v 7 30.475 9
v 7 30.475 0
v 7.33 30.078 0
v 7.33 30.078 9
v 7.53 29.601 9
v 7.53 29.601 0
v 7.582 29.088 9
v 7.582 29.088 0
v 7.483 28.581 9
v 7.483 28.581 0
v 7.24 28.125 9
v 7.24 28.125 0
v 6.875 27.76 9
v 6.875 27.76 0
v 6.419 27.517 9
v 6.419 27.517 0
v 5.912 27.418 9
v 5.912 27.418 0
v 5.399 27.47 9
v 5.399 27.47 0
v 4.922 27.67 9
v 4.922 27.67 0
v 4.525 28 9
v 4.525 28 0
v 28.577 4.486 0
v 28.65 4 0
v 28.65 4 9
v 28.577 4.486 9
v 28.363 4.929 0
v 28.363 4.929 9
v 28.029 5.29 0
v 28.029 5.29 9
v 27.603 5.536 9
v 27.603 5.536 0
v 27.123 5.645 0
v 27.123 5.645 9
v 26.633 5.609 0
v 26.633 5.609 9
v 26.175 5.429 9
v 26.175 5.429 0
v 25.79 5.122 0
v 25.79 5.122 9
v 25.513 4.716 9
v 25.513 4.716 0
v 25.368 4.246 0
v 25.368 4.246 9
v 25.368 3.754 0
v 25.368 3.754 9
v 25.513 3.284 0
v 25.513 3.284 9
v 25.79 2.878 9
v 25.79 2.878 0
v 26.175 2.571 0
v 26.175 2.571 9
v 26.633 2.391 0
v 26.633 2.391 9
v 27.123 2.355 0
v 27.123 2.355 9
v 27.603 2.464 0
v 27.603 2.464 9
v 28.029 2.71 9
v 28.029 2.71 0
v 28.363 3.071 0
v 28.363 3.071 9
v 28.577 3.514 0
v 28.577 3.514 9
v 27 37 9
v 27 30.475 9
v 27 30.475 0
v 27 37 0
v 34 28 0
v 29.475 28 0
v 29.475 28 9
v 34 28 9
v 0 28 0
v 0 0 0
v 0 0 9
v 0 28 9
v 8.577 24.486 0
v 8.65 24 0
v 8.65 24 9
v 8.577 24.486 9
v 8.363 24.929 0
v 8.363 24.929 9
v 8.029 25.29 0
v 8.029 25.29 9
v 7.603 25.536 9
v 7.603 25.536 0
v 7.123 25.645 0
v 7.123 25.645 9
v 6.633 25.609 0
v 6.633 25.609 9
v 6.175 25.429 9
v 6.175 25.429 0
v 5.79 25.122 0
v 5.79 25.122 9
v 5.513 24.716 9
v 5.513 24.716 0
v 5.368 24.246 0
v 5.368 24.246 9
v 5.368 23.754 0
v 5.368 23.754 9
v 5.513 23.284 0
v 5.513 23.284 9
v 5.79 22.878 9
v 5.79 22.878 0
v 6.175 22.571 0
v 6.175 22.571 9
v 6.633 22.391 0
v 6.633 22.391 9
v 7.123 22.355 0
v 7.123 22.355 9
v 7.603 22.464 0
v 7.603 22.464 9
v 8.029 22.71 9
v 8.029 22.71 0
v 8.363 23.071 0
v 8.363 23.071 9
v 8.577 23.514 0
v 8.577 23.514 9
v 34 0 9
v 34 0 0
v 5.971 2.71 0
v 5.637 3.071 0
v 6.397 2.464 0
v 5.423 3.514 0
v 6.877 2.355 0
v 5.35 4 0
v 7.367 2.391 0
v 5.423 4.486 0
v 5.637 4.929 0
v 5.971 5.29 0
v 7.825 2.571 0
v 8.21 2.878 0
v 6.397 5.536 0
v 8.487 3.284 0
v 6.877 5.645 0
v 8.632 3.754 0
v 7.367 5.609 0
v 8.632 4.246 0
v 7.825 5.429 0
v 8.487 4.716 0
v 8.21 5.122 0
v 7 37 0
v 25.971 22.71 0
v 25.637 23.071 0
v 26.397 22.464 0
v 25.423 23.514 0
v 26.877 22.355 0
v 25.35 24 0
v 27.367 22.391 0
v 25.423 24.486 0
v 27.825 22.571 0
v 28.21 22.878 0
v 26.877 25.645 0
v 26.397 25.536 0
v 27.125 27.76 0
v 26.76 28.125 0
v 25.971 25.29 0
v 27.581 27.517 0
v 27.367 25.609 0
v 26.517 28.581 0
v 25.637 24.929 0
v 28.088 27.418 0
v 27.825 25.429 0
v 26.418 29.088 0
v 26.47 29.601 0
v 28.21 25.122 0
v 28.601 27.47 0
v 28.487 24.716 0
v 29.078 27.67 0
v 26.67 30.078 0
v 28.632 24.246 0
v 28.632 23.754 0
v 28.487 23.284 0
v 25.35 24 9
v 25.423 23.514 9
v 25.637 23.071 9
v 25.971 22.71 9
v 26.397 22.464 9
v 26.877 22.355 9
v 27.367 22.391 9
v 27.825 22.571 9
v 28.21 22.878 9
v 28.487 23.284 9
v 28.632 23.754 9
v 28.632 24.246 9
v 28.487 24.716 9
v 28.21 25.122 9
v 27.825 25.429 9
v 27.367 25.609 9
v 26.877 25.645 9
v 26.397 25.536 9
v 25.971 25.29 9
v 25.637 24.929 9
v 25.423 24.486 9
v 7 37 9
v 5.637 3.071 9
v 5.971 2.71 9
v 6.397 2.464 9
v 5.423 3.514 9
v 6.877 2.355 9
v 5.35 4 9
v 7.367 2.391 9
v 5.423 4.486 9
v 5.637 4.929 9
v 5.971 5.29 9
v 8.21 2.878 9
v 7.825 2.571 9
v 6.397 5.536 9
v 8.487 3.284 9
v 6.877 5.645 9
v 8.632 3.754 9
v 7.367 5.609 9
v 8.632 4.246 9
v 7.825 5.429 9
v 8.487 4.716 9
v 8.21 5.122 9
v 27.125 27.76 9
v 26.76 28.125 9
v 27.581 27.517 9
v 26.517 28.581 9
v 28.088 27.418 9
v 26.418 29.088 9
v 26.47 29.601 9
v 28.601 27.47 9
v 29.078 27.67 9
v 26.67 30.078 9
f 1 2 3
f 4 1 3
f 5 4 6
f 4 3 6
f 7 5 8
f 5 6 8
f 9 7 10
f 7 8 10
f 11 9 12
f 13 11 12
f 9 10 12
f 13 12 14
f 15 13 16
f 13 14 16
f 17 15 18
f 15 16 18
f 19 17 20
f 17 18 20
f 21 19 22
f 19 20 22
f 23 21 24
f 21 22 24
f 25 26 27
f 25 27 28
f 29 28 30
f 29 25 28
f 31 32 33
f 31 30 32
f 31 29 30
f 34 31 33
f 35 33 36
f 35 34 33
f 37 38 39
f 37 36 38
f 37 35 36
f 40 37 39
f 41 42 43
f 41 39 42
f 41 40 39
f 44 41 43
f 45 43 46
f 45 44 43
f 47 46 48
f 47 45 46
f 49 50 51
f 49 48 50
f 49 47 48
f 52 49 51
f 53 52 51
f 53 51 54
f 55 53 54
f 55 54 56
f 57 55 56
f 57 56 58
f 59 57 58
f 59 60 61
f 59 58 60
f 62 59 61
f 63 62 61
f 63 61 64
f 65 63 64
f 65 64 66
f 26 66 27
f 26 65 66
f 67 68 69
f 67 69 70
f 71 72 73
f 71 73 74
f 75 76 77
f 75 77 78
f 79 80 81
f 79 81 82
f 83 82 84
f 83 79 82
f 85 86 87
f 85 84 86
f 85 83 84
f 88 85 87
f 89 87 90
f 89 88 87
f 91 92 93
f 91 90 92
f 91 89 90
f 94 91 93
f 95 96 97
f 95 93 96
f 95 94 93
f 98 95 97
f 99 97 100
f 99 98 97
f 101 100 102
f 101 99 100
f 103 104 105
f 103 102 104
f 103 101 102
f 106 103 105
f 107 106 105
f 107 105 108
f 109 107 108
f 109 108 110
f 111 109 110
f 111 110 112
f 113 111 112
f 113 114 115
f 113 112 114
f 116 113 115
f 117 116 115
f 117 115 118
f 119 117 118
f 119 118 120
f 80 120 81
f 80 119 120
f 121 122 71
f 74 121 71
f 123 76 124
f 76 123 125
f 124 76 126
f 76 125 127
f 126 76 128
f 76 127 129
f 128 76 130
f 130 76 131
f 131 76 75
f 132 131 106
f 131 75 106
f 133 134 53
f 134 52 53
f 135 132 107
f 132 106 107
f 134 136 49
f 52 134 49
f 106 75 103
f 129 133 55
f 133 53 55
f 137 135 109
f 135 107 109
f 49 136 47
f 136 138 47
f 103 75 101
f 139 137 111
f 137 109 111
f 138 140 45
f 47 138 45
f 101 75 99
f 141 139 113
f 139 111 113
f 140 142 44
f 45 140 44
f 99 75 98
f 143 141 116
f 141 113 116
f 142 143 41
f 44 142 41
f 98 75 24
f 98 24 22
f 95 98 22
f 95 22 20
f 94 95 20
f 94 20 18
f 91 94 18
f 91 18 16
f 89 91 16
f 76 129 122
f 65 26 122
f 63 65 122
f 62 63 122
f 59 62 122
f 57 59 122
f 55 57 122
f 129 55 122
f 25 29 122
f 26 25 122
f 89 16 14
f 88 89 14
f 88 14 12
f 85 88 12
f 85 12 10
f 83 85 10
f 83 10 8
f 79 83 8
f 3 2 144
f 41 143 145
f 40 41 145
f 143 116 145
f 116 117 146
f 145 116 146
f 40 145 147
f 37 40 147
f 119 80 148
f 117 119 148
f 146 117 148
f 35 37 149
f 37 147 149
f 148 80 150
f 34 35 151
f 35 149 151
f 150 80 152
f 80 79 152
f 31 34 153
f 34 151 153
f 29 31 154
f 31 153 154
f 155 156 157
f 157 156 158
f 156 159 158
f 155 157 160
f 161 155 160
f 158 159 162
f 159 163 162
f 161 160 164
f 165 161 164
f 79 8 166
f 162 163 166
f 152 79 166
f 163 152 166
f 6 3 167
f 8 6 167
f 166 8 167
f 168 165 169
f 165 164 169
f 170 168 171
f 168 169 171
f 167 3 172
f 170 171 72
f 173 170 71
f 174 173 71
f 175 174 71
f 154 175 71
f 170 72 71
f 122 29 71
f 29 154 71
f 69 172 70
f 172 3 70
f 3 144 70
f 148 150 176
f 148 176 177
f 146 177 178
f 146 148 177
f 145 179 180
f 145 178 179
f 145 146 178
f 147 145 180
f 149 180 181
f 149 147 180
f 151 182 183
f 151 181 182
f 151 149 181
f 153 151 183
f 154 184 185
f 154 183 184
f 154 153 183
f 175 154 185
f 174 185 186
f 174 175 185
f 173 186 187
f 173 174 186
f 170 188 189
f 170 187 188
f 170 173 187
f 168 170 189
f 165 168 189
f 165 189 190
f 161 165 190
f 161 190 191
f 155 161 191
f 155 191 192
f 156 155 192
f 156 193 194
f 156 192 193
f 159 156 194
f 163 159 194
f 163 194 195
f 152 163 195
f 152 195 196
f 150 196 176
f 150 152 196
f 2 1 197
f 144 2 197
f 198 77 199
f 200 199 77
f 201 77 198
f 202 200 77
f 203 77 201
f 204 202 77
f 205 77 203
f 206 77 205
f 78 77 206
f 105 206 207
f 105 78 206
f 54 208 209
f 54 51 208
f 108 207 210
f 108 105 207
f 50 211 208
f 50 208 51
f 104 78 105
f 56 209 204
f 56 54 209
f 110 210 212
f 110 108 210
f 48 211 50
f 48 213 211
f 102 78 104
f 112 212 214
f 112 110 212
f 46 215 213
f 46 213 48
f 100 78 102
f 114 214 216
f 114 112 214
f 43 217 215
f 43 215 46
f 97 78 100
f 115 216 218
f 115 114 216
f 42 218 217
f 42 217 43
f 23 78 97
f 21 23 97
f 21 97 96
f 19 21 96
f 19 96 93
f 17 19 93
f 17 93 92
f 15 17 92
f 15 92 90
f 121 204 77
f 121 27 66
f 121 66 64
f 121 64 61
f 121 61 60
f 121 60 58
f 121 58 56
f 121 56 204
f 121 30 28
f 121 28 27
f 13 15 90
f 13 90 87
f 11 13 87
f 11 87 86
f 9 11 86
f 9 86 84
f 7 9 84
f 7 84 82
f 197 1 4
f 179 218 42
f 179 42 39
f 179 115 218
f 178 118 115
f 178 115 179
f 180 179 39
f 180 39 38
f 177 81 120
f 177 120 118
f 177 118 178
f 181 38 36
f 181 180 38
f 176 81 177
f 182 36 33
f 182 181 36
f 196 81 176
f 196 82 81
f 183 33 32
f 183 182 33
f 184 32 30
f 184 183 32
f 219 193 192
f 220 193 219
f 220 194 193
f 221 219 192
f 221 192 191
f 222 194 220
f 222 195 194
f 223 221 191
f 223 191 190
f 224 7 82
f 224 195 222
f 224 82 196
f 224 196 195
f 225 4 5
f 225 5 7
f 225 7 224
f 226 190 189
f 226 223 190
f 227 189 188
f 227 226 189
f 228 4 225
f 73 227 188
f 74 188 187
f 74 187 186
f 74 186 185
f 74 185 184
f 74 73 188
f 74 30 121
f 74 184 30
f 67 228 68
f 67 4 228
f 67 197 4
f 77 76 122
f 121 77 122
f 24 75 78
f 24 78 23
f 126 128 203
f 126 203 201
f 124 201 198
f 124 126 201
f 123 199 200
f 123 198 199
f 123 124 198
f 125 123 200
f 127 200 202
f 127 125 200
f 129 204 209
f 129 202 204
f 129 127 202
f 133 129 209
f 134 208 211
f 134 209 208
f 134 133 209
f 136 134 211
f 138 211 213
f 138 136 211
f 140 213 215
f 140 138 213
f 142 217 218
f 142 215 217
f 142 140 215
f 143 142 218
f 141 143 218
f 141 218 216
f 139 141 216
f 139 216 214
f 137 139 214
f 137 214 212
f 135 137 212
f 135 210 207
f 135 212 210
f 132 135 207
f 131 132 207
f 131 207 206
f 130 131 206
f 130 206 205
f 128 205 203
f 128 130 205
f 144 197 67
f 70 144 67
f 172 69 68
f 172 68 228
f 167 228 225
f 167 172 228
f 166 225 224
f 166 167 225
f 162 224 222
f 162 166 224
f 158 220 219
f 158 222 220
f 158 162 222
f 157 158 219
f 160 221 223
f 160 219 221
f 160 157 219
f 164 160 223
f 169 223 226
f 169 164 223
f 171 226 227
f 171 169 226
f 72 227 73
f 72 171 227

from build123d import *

# Parameters (mm, degrees)
ESQUISSE1_W                  = 34
ESQUISSE1_H                  = 28
BOSS_EXTRU_1_DEPTH           = 9
ESQUISSE2_W                  = 20
ESQUISSE2_H                  = 9
BOSS_EXTRU_2_DEPTH           = 9
ENL_V_MAT_EXTRU_1_DEPTH      = 52.048996072
ENL_V_MAT_EXTRU_1_DEPTH_BACK = 52.048996072
ENL_V_MAT_EXTRU_2_DEPTH      = 52.048996072
ENL_V_MAT_EXTRU_2_DEPTH_BACK = 52.048996072
ESQUISSE4_R                  = 1.65


with BuildPart() as part:
    # Esquisse1 → Boss.-Extru.1 (new body)
    with BuildSketch(Plane.XY):
        with Locations((17, 14)):
            Rectangle(ESQUISSE1_W, ESQUISSE1_H)
    extrude(amount=BOSS_EXTRU_1_DEPTH)

    # Esquisse2 → Boss.-Extru.2 (add)
    with BuildSketch(Plane.XY.offset(9)):
        with Locations((17, 32.5)):
            Rectangle(ESQUISSE2_W, ESQUISSE2_H)
    extrude(amount=-BOSS_EXTRU_2_DEPTH)

    # Esquisse3 → Enlèv. mat.-Extru.1 (cut, two sides: drawn at the far end of the back side and taken through both)
    with BuildSketch(Plane.XY.offset(9).offset(-ENL_V_MAT_EXTRU_1_DEPTH_BACK)):
        with BuildLine():
            Line((4.525126266, 28), (7, 30.474873734))
            ThreePointArc((7, 30.474873734), (7.070710678, 27.929289322), (4.525126266, 28))
        make_face()
        with BuildLine():
            Line((29.474873734, 28), (27, 30.474873734))
            ThreePointArc((27, 30.474873734), (26.929289322, 27.929289322), (29.474873734, 28))
        make_face()
    extrude(amount=ENL_V_MAT_EXTRU_1_DEPTH + ENL_V_MAT_EXTRU_1_DEPTH_BACK, mode=Mode.SUBTRACT)

    # Esquisse4 → Enlèv. mat.-Extru.2 (cut, two sides: drawn at the far end of the back side and taken through both)
    with BuildSketch(Plane.XY.offset(9).offset(-ENL_V_MAT_EXTRU_2_DEPTH_BACK)):
        with Locations((7, 24)):
            Circle(ESQUISSE4_R)
        with Locations(Location((27, 24, 0), (0, 0, 180))):
            Circle(ESQUISSE4_R)
        with Locations((27, 4)):
            Circle(ESQUISSE4_R)
        with Locations(Location((7, 4, 0), (0, 0, 180))):
            Circle(ESQUISSE4_R)
    extrude(amount=ENL_V_MAT_EXTRU_2_DEPTH + ENL_V_MAT_EXTRU_2_DEPTH_BACK, mode=Mode.SUBTRACT)


solid = part.part
